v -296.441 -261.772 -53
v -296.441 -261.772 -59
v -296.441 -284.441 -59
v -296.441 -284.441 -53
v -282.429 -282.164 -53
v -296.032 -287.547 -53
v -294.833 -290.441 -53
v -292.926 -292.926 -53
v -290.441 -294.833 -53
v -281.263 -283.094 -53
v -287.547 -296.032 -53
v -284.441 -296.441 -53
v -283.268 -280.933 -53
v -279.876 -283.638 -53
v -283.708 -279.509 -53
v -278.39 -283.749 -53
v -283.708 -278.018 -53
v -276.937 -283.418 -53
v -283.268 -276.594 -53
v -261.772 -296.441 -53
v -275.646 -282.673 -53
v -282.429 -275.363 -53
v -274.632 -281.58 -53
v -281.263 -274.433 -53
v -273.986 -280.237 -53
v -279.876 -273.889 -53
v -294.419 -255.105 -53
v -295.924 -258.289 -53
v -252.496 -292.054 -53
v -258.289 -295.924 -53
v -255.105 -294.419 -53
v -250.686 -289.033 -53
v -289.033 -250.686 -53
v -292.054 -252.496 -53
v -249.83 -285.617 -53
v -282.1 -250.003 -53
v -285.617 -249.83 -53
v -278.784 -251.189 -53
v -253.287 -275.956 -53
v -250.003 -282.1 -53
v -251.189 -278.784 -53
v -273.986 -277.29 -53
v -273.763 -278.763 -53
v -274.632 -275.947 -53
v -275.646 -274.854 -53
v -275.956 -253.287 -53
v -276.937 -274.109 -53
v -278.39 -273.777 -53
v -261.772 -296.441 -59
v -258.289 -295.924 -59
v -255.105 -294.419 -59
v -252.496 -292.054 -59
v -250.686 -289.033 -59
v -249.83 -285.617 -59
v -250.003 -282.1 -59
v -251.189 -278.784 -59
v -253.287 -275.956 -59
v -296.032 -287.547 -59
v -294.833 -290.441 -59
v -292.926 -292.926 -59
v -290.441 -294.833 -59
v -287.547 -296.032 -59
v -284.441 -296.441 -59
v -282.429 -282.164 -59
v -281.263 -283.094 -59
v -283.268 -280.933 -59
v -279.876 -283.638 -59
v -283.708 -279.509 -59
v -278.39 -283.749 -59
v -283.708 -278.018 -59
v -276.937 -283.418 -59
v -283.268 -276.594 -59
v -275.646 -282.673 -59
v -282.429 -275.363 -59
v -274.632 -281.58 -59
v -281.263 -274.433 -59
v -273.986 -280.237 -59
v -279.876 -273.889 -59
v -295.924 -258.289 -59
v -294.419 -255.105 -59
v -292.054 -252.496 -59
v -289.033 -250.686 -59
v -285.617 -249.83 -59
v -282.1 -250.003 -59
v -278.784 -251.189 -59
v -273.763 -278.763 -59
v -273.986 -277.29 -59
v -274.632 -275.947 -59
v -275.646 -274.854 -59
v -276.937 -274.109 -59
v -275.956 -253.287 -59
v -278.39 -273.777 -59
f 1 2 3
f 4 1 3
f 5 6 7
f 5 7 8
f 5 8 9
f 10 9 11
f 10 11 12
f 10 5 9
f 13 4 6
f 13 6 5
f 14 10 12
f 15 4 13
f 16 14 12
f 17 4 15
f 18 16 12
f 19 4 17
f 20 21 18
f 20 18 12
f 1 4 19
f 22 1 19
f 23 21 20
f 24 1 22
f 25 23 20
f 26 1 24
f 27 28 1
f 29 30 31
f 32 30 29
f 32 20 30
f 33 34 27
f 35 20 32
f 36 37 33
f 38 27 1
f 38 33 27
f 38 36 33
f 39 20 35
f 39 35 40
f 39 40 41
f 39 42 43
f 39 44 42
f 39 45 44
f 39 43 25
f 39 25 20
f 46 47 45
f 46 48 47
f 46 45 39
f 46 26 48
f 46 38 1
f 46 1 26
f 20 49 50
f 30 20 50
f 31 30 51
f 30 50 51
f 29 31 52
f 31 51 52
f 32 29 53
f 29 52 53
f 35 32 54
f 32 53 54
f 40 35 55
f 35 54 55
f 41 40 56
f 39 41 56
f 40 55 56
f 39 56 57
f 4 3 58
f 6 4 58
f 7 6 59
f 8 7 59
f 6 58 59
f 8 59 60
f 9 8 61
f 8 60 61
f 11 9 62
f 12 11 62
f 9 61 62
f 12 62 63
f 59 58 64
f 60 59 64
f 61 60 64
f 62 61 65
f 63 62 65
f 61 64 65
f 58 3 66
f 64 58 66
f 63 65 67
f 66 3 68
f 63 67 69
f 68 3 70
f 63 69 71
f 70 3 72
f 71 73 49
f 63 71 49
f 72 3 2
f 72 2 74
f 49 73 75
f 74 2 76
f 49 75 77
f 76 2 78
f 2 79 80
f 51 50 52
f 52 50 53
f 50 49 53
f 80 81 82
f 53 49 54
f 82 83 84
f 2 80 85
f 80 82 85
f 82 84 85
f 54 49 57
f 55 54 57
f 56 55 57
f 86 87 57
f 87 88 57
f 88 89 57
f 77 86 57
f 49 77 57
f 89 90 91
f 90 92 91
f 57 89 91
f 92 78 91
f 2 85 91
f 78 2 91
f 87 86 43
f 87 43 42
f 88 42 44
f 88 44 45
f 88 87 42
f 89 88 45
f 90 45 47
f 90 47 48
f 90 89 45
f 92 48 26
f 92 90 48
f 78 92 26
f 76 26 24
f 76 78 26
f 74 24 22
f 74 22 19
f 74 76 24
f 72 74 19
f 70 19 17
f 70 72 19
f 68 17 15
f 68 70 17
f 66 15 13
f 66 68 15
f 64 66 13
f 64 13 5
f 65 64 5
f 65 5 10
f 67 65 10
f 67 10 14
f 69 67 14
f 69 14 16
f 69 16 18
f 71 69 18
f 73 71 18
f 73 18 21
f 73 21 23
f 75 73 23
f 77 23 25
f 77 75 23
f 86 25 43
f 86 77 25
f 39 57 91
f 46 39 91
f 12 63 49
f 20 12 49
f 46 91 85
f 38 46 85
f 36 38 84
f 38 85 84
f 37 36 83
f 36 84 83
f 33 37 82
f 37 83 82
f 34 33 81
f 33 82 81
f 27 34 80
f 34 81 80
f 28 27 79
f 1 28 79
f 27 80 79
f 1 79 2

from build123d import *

# Parameters (mm, degrees)
BOSS_EXTRUDE1_START = -59
SKETCH1_R           = 5
BOSS_EXTRUDE1_DEPTH = 6


with BuildPart() as part:
    # Sketch1 → Boss-Extrude1 (new body)
    with BuildSketch(Plane.XY.offset(BOSS_EXTRUDE1_START)):
        with BuildLine():
            Line((-253.286796564, -275.955844123), (-275.955844123, -253.286796564))
            ThreePointArc((-275.955844123, -253.286796564), (-289.033326685, -250.685523549), (-296.441125497, -261.772077939))
            Line((-296.441125497, -261.772077939), (-296.441125497, -284.441125497))
            ThreePointArc((-296.441125497, -284.441125497), (-292.926406871, -292.926406871), (-284.441125497, -296.441125497))
            Line((-284.441125497, -296.441125497), (-261.772077939, -296.441125497))
            ThreePointArc((-261.772077939, -296.441125497), (-250.685523549, -289.033326685), (-253.286796564, -275.955844123))
        make_face()
        with Locations((-278.763455967, -278.763455967)):
            Circle(SKETCH1_R, mode=Mode.SUBTRACT)
    extrude(amount=BOSS_EXTRUDE1_DEPTH)


solid = part.part
